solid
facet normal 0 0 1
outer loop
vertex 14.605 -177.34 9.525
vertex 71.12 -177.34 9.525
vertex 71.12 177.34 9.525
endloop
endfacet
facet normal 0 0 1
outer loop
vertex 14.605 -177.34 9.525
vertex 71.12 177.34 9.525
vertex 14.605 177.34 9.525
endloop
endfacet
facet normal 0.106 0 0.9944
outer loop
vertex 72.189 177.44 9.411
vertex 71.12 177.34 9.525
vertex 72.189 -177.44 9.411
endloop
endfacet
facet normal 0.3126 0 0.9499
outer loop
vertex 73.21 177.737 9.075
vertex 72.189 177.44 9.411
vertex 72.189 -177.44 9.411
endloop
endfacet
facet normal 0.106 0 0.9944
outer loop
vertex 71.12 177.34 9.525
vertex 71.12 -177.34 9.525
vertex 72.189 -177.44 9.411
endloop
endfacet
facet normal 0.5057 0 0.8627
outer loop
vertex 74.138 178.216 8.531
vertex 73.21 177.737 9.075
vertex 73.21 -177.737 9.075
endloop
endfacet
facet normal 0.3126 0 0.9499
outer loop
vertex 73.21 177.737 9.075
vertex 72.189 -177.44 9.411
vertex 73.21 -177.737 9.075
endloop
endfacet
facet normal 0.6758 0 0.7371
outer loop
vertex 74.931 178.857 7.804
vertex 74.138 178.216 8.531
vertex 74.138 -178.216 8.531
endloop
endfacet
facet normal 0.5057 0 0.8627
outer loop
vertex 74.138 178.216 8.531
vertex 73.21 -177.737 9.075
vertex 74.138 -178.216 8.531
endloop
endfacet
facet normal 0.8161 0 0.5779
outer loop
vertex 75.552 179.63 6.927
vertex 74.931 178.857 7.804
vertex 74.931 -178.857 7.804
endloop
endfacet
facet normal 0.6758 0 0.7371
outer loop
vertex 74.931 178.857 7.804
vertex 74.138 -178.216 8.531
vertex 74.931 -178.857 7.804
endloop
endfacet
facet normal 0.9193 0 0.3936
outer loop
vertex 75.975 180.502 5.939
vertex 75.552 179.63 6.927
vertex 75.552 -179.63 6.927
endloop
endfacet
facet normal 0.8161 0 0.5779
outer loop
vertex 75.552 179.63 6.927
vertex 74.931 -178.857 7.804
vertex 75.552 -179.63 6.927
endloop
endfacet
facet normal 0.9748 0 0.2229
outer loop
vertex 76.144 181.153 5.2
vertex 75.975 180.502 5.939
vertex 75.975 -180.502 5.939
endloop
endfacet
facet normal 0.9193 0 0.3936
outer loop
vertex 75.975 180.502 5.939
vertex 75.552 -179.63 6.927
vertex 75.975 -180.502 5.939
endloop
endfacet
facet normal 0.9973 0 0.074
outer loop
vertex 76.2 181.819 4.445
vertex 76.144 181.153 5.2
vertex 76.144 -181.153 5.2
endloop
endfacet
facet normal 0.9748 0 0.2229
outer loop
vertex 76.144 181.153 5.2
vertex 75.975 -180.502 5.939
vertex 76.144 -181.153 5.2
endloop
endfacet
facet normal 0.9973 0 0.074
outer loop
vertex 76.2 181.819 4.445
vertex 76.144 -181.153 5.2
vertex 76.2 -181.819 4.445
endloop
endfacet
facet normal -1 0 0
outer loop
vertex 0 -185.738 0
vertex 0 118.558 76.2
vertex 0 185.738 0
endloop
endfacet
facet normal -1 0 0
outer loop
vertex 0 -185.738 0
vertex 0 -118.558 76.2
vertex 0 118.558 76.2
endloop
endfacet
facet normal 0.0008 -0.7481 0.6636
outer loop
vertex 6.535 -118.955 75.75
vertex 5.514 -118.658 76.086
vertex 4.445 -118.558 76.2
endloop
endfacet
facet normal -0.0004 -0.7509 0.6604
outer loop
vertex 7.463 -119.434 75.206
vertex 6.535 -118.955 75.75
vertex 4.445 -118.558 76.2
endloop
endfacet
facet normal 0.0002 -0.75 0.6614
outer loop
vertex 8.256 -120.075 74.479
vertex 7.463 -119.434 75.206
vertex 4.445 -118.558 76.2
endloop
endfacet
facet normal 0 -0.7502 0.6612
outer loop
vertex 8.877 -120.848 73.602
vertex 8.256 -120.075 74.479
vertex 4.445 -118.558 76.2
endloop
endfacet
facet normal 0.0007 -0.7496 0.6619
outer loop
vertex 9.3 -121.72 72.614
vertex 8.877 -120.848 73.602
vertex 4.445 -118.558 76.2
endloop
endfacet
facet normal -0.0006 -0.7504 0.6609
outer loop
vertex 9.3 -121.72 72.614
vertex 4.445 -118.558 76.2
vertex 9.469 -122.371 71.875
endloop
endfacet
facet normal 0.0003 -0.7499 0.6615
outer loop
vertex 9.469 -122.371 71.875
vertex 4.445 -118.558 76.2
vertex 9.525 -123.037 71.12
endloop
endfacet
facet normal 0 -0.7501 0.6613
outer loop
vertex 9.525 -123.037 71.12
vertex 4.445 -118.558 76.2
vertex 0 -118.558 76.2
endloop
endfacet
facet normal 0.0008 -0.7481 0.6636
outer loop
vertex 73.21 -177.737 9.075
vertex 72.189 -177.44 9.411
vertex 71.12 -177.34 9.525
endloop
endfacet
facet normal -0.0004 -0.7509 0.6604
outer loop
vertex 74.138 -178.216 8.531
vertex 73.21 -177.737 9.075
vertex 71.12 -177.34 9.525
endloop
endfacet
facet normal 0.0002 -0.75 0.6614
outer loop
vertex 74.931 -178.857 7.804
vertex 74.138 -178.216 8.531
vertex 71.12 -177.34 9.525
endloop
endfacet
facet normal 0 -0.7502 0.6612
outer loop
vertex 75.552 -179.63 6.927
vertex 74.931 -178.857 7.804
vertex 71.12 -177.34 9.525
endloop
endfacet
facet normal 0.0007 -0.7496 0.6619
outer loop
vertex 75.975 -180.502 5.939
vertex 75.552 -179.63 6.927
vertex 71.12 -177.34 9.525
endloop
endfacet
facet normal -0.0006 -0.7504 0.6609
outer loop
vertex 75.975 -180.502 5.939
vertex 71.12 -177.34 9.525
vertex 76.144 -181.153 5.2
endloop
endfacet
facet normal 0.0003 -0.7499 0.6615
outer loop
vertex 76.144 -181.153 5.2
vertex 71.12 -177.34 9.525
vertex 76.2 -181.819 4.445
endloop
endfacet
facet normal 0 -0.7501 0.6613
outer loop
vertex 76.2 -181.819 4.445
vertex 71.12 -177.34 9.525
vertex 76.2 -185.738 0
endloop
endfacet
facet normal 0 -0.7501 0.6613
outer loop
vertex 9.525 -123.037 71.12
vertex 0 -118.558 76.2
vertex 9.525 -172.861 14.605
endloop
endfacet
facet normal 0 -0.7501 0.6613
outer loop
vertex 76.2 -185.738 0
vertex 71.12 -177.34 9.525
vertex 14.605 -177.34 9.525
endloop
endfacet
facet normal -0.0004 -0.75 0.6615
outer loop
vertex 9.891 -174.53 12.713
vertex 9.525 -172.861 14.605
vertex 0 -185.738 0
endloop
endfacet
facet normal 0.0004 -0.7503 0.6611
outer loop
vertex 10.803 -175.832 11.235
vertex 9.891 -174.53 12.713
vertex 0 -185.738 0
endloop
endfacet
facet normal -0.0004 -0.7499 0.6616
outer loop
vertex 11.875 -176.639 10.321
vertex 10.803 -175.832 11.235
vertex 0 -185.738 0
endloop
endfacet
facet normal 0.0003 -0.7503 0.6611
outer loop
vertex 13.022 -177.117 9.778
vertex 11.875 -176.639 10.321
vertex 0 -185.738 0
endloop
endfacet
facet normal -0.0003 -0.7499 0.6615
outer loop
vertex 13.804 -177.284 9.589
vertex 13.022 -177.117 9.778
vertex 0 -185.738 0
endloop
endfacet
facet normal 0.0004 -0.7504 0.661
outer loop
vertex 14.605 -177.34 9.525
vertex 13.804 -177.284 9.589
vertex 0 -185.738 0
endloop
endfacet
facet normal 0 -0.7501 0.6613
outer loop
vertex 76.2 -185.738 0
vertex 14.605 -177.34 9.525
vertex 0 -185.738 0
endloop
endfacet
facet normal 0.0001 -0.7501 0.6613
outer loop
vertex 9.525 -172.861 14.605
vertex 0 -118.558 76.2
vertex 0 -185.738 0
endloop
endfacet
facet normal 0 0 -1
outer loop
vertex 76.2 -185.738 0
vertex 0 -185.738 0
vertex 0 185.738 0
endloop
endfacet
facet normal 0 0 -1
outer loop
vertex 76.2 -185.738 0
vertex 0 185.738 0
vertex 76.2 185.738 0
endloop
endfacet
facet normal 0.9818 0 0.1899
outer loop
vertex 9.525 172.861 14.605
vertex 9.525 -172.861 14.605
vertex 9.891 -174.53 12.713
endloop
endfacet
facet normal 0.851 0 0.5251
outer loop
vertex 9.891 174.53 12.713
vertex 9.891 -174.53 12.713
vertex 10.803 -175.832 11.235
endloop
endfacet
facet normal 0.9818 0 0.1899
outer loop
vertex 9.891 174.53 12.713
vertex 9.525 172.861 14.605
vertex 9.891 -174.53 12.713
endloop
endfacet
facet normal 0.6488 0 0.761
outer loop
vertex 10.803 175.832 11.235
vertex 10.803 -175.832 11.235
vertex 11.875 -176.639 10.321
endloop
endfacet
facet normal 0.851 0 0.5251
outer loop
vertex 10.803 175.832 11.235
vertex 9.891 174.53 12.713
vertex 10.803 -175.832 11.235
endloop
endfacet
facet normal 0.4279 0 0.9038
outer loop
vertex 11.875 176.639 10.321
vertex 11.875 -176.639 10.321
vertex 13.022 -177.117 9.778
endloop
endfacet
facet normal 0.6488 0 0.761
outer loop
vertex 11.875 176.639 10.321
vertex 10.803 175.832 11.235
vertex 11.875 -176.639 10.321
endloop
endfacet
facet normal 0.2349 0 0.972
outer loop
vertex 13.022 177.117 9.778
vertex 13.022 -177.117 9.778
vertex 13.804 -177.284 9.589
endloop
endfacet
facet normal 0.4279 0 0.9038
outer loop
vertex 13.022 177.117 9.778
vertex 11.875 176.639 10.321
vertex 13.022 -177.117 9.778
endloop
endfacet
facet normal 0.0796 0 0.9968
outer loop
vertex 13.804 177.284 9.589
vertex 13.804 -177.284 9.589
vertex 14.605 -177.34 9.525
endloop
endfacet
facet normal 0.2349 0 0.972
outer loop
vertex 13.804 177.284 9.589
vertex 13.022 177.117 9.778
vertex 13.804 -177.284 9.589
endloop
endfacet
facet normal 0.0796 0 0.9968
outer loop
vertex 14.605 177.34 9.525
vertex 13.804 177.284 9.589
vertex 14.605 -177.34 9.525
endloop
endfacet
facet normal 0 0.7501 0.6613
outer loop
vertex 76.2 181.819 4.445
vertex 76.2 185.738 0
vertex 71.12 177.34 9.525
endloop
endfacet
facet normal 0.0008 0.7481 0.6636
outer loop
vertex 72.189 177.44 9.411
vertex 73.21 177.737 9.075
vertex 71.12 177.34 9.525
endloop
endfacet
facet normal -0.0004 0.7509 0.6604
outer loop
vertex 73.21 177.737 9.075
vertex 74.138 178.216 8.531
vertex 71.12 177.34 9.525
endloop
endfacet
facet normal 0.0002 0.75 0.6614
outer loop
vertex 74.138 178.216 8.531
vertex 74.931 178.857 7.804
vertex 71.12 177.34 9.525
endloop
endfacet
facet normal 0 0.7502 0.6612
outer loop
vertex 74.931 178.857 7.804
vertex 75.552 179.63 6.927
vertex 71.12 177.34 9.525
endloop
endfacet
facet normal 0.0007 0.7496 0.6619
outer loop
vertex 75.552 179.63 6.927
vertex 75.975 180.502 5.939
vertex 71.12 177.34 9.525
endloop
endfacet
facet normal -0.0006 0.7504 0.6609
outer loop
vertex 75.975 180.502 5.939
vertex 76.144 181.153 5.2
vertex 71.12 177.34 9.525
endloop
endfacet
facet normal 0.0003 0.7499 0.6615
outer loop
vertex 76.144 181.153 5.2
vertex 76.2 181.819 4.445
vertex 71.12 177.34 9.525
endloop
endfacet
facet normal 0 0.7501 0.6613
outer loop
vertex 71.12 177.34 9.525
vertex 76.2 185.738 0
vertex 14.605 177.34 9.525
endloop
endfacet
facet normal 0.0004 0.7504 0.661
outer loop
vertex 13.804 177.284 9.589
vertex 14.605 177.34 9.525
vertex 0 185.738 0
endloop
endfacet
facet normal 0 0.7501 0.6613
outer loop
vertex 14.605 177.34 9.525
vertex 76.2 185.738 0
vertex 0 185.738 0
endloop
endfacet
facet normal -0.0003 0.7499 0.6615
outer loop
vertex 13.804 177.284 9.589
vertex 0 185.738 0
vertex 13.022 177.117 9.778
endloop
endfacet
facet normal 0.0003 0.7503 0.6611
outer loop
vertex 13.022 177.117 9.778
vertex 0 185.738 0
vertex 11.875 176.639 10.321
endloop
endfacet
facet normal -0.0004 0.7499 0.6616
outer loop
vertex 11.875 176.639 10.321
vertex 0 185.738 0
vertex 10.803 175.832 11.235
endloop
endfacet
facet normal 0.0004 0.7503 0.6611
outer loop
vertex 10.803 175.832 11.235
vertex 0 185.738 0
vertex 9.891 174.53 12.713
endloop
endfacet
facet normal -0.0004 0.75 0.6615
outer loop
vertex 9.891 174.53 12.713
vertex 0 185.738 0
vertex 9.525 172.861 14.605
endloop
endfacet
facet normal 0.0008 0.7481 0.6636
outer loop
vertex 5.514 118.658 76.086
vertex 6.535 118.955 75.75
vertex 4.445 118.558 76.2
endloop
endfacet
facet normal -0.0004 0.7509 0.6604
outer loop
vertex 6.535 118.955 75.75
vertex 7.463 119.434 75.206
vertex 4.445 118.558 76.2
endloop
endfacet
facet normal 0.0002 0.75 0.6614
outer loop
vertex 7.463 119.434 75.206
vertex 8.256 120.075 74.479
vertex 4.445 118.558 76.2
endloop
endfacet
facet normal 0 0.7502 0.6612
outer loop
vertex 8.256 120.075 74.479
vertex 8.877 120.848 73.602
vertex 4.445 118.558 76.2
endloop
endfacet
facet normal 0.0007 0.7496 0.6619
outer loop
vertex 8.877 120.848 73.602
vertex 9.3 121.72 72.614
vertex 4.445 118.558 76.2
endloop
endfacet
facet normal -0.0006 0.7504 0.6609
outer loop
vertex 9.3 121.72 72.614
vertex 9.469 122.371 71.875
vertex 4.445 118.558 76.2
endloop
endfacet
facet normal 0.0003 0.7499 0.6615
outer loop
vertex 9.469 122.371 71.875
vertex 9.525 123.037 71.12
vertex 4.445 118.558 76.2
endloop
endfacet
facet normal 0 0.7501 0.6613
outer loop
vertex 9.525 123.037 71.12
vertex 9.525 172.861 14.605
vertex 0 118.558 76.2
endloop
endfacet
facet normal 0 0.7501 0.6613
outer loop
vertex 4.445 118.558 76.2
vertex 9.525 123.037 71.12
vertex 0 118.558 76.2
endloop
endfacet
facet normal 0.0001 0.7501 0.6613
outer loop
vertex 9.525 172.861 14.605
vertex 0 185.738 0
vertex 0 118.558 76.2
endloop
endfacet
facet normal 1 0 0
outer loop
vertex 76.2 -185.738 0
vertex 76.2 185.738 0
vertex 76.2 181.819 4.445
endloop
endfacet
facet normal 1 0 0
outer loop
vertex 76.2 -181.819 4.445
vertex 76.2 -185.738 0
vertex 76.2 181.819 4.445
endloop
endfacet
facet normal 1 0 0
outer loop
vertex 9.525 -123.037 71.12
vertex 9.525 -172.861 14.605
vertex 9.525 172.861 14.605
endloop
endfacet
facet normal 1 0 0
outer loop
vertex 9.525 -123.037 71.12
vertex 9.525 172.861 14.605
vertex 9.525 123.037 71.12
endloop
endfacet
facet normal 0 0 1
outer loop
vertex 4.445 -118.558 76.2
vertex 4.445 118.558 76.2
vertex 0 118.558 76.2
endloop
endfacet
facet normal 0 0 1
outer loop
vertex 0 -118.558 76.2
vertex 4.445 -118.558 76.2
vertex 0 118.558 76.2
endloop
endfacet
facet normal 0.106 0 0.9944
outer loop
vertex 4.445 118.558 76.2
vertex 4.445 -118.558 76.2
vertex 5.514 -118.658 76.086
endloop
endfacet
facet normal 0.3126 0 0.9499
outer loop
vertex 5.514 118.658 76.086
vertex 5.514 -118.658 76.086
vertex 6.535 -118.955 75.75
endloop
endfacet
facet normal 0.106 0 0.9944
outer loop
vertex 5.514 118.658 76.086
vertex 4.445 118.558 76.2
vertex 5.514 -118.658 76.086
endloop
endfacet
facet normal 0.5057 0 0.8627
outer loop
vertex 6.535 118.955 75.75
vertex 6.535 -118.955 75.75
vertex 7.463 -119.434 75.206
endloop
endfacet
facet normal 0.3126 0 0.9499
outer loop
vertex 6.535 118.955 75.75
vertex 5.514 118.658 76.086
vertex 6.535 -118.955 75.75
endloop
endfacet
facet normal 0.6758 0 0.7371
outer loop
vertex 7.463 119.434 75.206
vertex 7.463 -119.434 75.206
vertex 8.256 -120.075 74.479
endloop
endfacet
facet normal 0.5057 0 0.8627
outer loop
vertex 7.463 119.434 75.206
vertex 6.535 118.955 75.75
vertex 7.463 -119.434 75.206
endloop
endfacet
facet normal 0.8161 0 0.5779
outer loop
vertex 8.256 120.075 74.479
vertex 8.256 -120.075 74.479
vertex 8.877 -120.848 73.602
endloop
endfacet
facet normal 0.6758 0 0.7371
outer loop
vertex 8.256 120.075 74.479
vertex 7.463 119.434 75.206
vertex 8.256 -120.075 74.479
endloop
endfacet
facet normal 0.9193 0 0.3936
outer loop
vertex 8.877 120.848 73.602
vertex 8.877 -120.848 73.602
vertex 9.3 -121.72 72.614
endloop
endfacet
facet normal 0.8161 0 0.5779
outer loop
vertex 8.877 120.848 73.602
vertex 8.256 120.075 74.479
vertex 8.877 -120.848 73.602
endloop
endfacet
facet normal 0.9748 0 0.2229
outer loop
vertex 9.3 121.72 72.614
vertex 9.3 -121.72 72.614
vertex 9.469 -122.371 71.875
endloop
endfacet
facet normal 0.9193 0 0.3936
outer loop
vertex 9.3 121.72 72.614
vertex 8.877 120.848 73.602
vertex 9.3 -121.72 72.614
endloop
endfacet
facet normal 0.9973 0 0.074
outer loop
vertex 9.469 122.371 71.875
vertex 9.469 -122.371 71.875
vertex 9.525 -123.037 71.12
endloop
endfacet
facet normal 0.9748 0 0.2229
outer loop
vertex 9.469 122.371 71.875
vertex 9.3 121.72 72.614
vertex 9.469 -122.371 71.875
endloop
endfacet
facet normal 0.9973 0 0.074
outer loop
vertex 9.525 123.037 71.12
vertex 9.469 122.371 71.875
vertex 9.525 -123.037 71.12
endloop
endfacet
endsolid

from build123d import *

# Parameters (mm, degrees)
F1_DEPTH = 185.7375
F3_DEPTH = 76.2
F4_R     = 5.08


with BuildPart() as f1:
    # F0 (on Front) → F1 (new body, symmetric)
    with BuildSketch(Plane.XZ):
        Polygon((0, 76.2), (0, 0), (76.2, 0), (76.2, 9.525), (9.525, 9.525), (9.525, 76.2), align=None)
    extrude(amount=F1_DEPTH, both=True)

    # F2 (on face) → F3 (cut)
    with BuildSketch(Plane(origin=(0, 0, 0), x_dir=(0, -1, 0), z_dir=(-1, 0, 0))):
        Polygon((-185.7375, 76.2), (-185.7375, 0), (-118.558163, 76.2), align=None)
        Polygon((118.558163, 76.2), (185.7375, 0), (185.7375, 76.2), align=None)
    extrude(amount=-F3_DEPTH, mode=Mode.SUBTRACT)

    # F4
    f4_edges = [f1.edges().sort_by_distance(p)[0] for p in [
        (9.525, 0, 76.2),
        (9.525, 0, 9.525),
        (76.2, 0, 9.525),
    ]]
    fillet(f4_edges, radius=F4_R)


solid = f1.part
